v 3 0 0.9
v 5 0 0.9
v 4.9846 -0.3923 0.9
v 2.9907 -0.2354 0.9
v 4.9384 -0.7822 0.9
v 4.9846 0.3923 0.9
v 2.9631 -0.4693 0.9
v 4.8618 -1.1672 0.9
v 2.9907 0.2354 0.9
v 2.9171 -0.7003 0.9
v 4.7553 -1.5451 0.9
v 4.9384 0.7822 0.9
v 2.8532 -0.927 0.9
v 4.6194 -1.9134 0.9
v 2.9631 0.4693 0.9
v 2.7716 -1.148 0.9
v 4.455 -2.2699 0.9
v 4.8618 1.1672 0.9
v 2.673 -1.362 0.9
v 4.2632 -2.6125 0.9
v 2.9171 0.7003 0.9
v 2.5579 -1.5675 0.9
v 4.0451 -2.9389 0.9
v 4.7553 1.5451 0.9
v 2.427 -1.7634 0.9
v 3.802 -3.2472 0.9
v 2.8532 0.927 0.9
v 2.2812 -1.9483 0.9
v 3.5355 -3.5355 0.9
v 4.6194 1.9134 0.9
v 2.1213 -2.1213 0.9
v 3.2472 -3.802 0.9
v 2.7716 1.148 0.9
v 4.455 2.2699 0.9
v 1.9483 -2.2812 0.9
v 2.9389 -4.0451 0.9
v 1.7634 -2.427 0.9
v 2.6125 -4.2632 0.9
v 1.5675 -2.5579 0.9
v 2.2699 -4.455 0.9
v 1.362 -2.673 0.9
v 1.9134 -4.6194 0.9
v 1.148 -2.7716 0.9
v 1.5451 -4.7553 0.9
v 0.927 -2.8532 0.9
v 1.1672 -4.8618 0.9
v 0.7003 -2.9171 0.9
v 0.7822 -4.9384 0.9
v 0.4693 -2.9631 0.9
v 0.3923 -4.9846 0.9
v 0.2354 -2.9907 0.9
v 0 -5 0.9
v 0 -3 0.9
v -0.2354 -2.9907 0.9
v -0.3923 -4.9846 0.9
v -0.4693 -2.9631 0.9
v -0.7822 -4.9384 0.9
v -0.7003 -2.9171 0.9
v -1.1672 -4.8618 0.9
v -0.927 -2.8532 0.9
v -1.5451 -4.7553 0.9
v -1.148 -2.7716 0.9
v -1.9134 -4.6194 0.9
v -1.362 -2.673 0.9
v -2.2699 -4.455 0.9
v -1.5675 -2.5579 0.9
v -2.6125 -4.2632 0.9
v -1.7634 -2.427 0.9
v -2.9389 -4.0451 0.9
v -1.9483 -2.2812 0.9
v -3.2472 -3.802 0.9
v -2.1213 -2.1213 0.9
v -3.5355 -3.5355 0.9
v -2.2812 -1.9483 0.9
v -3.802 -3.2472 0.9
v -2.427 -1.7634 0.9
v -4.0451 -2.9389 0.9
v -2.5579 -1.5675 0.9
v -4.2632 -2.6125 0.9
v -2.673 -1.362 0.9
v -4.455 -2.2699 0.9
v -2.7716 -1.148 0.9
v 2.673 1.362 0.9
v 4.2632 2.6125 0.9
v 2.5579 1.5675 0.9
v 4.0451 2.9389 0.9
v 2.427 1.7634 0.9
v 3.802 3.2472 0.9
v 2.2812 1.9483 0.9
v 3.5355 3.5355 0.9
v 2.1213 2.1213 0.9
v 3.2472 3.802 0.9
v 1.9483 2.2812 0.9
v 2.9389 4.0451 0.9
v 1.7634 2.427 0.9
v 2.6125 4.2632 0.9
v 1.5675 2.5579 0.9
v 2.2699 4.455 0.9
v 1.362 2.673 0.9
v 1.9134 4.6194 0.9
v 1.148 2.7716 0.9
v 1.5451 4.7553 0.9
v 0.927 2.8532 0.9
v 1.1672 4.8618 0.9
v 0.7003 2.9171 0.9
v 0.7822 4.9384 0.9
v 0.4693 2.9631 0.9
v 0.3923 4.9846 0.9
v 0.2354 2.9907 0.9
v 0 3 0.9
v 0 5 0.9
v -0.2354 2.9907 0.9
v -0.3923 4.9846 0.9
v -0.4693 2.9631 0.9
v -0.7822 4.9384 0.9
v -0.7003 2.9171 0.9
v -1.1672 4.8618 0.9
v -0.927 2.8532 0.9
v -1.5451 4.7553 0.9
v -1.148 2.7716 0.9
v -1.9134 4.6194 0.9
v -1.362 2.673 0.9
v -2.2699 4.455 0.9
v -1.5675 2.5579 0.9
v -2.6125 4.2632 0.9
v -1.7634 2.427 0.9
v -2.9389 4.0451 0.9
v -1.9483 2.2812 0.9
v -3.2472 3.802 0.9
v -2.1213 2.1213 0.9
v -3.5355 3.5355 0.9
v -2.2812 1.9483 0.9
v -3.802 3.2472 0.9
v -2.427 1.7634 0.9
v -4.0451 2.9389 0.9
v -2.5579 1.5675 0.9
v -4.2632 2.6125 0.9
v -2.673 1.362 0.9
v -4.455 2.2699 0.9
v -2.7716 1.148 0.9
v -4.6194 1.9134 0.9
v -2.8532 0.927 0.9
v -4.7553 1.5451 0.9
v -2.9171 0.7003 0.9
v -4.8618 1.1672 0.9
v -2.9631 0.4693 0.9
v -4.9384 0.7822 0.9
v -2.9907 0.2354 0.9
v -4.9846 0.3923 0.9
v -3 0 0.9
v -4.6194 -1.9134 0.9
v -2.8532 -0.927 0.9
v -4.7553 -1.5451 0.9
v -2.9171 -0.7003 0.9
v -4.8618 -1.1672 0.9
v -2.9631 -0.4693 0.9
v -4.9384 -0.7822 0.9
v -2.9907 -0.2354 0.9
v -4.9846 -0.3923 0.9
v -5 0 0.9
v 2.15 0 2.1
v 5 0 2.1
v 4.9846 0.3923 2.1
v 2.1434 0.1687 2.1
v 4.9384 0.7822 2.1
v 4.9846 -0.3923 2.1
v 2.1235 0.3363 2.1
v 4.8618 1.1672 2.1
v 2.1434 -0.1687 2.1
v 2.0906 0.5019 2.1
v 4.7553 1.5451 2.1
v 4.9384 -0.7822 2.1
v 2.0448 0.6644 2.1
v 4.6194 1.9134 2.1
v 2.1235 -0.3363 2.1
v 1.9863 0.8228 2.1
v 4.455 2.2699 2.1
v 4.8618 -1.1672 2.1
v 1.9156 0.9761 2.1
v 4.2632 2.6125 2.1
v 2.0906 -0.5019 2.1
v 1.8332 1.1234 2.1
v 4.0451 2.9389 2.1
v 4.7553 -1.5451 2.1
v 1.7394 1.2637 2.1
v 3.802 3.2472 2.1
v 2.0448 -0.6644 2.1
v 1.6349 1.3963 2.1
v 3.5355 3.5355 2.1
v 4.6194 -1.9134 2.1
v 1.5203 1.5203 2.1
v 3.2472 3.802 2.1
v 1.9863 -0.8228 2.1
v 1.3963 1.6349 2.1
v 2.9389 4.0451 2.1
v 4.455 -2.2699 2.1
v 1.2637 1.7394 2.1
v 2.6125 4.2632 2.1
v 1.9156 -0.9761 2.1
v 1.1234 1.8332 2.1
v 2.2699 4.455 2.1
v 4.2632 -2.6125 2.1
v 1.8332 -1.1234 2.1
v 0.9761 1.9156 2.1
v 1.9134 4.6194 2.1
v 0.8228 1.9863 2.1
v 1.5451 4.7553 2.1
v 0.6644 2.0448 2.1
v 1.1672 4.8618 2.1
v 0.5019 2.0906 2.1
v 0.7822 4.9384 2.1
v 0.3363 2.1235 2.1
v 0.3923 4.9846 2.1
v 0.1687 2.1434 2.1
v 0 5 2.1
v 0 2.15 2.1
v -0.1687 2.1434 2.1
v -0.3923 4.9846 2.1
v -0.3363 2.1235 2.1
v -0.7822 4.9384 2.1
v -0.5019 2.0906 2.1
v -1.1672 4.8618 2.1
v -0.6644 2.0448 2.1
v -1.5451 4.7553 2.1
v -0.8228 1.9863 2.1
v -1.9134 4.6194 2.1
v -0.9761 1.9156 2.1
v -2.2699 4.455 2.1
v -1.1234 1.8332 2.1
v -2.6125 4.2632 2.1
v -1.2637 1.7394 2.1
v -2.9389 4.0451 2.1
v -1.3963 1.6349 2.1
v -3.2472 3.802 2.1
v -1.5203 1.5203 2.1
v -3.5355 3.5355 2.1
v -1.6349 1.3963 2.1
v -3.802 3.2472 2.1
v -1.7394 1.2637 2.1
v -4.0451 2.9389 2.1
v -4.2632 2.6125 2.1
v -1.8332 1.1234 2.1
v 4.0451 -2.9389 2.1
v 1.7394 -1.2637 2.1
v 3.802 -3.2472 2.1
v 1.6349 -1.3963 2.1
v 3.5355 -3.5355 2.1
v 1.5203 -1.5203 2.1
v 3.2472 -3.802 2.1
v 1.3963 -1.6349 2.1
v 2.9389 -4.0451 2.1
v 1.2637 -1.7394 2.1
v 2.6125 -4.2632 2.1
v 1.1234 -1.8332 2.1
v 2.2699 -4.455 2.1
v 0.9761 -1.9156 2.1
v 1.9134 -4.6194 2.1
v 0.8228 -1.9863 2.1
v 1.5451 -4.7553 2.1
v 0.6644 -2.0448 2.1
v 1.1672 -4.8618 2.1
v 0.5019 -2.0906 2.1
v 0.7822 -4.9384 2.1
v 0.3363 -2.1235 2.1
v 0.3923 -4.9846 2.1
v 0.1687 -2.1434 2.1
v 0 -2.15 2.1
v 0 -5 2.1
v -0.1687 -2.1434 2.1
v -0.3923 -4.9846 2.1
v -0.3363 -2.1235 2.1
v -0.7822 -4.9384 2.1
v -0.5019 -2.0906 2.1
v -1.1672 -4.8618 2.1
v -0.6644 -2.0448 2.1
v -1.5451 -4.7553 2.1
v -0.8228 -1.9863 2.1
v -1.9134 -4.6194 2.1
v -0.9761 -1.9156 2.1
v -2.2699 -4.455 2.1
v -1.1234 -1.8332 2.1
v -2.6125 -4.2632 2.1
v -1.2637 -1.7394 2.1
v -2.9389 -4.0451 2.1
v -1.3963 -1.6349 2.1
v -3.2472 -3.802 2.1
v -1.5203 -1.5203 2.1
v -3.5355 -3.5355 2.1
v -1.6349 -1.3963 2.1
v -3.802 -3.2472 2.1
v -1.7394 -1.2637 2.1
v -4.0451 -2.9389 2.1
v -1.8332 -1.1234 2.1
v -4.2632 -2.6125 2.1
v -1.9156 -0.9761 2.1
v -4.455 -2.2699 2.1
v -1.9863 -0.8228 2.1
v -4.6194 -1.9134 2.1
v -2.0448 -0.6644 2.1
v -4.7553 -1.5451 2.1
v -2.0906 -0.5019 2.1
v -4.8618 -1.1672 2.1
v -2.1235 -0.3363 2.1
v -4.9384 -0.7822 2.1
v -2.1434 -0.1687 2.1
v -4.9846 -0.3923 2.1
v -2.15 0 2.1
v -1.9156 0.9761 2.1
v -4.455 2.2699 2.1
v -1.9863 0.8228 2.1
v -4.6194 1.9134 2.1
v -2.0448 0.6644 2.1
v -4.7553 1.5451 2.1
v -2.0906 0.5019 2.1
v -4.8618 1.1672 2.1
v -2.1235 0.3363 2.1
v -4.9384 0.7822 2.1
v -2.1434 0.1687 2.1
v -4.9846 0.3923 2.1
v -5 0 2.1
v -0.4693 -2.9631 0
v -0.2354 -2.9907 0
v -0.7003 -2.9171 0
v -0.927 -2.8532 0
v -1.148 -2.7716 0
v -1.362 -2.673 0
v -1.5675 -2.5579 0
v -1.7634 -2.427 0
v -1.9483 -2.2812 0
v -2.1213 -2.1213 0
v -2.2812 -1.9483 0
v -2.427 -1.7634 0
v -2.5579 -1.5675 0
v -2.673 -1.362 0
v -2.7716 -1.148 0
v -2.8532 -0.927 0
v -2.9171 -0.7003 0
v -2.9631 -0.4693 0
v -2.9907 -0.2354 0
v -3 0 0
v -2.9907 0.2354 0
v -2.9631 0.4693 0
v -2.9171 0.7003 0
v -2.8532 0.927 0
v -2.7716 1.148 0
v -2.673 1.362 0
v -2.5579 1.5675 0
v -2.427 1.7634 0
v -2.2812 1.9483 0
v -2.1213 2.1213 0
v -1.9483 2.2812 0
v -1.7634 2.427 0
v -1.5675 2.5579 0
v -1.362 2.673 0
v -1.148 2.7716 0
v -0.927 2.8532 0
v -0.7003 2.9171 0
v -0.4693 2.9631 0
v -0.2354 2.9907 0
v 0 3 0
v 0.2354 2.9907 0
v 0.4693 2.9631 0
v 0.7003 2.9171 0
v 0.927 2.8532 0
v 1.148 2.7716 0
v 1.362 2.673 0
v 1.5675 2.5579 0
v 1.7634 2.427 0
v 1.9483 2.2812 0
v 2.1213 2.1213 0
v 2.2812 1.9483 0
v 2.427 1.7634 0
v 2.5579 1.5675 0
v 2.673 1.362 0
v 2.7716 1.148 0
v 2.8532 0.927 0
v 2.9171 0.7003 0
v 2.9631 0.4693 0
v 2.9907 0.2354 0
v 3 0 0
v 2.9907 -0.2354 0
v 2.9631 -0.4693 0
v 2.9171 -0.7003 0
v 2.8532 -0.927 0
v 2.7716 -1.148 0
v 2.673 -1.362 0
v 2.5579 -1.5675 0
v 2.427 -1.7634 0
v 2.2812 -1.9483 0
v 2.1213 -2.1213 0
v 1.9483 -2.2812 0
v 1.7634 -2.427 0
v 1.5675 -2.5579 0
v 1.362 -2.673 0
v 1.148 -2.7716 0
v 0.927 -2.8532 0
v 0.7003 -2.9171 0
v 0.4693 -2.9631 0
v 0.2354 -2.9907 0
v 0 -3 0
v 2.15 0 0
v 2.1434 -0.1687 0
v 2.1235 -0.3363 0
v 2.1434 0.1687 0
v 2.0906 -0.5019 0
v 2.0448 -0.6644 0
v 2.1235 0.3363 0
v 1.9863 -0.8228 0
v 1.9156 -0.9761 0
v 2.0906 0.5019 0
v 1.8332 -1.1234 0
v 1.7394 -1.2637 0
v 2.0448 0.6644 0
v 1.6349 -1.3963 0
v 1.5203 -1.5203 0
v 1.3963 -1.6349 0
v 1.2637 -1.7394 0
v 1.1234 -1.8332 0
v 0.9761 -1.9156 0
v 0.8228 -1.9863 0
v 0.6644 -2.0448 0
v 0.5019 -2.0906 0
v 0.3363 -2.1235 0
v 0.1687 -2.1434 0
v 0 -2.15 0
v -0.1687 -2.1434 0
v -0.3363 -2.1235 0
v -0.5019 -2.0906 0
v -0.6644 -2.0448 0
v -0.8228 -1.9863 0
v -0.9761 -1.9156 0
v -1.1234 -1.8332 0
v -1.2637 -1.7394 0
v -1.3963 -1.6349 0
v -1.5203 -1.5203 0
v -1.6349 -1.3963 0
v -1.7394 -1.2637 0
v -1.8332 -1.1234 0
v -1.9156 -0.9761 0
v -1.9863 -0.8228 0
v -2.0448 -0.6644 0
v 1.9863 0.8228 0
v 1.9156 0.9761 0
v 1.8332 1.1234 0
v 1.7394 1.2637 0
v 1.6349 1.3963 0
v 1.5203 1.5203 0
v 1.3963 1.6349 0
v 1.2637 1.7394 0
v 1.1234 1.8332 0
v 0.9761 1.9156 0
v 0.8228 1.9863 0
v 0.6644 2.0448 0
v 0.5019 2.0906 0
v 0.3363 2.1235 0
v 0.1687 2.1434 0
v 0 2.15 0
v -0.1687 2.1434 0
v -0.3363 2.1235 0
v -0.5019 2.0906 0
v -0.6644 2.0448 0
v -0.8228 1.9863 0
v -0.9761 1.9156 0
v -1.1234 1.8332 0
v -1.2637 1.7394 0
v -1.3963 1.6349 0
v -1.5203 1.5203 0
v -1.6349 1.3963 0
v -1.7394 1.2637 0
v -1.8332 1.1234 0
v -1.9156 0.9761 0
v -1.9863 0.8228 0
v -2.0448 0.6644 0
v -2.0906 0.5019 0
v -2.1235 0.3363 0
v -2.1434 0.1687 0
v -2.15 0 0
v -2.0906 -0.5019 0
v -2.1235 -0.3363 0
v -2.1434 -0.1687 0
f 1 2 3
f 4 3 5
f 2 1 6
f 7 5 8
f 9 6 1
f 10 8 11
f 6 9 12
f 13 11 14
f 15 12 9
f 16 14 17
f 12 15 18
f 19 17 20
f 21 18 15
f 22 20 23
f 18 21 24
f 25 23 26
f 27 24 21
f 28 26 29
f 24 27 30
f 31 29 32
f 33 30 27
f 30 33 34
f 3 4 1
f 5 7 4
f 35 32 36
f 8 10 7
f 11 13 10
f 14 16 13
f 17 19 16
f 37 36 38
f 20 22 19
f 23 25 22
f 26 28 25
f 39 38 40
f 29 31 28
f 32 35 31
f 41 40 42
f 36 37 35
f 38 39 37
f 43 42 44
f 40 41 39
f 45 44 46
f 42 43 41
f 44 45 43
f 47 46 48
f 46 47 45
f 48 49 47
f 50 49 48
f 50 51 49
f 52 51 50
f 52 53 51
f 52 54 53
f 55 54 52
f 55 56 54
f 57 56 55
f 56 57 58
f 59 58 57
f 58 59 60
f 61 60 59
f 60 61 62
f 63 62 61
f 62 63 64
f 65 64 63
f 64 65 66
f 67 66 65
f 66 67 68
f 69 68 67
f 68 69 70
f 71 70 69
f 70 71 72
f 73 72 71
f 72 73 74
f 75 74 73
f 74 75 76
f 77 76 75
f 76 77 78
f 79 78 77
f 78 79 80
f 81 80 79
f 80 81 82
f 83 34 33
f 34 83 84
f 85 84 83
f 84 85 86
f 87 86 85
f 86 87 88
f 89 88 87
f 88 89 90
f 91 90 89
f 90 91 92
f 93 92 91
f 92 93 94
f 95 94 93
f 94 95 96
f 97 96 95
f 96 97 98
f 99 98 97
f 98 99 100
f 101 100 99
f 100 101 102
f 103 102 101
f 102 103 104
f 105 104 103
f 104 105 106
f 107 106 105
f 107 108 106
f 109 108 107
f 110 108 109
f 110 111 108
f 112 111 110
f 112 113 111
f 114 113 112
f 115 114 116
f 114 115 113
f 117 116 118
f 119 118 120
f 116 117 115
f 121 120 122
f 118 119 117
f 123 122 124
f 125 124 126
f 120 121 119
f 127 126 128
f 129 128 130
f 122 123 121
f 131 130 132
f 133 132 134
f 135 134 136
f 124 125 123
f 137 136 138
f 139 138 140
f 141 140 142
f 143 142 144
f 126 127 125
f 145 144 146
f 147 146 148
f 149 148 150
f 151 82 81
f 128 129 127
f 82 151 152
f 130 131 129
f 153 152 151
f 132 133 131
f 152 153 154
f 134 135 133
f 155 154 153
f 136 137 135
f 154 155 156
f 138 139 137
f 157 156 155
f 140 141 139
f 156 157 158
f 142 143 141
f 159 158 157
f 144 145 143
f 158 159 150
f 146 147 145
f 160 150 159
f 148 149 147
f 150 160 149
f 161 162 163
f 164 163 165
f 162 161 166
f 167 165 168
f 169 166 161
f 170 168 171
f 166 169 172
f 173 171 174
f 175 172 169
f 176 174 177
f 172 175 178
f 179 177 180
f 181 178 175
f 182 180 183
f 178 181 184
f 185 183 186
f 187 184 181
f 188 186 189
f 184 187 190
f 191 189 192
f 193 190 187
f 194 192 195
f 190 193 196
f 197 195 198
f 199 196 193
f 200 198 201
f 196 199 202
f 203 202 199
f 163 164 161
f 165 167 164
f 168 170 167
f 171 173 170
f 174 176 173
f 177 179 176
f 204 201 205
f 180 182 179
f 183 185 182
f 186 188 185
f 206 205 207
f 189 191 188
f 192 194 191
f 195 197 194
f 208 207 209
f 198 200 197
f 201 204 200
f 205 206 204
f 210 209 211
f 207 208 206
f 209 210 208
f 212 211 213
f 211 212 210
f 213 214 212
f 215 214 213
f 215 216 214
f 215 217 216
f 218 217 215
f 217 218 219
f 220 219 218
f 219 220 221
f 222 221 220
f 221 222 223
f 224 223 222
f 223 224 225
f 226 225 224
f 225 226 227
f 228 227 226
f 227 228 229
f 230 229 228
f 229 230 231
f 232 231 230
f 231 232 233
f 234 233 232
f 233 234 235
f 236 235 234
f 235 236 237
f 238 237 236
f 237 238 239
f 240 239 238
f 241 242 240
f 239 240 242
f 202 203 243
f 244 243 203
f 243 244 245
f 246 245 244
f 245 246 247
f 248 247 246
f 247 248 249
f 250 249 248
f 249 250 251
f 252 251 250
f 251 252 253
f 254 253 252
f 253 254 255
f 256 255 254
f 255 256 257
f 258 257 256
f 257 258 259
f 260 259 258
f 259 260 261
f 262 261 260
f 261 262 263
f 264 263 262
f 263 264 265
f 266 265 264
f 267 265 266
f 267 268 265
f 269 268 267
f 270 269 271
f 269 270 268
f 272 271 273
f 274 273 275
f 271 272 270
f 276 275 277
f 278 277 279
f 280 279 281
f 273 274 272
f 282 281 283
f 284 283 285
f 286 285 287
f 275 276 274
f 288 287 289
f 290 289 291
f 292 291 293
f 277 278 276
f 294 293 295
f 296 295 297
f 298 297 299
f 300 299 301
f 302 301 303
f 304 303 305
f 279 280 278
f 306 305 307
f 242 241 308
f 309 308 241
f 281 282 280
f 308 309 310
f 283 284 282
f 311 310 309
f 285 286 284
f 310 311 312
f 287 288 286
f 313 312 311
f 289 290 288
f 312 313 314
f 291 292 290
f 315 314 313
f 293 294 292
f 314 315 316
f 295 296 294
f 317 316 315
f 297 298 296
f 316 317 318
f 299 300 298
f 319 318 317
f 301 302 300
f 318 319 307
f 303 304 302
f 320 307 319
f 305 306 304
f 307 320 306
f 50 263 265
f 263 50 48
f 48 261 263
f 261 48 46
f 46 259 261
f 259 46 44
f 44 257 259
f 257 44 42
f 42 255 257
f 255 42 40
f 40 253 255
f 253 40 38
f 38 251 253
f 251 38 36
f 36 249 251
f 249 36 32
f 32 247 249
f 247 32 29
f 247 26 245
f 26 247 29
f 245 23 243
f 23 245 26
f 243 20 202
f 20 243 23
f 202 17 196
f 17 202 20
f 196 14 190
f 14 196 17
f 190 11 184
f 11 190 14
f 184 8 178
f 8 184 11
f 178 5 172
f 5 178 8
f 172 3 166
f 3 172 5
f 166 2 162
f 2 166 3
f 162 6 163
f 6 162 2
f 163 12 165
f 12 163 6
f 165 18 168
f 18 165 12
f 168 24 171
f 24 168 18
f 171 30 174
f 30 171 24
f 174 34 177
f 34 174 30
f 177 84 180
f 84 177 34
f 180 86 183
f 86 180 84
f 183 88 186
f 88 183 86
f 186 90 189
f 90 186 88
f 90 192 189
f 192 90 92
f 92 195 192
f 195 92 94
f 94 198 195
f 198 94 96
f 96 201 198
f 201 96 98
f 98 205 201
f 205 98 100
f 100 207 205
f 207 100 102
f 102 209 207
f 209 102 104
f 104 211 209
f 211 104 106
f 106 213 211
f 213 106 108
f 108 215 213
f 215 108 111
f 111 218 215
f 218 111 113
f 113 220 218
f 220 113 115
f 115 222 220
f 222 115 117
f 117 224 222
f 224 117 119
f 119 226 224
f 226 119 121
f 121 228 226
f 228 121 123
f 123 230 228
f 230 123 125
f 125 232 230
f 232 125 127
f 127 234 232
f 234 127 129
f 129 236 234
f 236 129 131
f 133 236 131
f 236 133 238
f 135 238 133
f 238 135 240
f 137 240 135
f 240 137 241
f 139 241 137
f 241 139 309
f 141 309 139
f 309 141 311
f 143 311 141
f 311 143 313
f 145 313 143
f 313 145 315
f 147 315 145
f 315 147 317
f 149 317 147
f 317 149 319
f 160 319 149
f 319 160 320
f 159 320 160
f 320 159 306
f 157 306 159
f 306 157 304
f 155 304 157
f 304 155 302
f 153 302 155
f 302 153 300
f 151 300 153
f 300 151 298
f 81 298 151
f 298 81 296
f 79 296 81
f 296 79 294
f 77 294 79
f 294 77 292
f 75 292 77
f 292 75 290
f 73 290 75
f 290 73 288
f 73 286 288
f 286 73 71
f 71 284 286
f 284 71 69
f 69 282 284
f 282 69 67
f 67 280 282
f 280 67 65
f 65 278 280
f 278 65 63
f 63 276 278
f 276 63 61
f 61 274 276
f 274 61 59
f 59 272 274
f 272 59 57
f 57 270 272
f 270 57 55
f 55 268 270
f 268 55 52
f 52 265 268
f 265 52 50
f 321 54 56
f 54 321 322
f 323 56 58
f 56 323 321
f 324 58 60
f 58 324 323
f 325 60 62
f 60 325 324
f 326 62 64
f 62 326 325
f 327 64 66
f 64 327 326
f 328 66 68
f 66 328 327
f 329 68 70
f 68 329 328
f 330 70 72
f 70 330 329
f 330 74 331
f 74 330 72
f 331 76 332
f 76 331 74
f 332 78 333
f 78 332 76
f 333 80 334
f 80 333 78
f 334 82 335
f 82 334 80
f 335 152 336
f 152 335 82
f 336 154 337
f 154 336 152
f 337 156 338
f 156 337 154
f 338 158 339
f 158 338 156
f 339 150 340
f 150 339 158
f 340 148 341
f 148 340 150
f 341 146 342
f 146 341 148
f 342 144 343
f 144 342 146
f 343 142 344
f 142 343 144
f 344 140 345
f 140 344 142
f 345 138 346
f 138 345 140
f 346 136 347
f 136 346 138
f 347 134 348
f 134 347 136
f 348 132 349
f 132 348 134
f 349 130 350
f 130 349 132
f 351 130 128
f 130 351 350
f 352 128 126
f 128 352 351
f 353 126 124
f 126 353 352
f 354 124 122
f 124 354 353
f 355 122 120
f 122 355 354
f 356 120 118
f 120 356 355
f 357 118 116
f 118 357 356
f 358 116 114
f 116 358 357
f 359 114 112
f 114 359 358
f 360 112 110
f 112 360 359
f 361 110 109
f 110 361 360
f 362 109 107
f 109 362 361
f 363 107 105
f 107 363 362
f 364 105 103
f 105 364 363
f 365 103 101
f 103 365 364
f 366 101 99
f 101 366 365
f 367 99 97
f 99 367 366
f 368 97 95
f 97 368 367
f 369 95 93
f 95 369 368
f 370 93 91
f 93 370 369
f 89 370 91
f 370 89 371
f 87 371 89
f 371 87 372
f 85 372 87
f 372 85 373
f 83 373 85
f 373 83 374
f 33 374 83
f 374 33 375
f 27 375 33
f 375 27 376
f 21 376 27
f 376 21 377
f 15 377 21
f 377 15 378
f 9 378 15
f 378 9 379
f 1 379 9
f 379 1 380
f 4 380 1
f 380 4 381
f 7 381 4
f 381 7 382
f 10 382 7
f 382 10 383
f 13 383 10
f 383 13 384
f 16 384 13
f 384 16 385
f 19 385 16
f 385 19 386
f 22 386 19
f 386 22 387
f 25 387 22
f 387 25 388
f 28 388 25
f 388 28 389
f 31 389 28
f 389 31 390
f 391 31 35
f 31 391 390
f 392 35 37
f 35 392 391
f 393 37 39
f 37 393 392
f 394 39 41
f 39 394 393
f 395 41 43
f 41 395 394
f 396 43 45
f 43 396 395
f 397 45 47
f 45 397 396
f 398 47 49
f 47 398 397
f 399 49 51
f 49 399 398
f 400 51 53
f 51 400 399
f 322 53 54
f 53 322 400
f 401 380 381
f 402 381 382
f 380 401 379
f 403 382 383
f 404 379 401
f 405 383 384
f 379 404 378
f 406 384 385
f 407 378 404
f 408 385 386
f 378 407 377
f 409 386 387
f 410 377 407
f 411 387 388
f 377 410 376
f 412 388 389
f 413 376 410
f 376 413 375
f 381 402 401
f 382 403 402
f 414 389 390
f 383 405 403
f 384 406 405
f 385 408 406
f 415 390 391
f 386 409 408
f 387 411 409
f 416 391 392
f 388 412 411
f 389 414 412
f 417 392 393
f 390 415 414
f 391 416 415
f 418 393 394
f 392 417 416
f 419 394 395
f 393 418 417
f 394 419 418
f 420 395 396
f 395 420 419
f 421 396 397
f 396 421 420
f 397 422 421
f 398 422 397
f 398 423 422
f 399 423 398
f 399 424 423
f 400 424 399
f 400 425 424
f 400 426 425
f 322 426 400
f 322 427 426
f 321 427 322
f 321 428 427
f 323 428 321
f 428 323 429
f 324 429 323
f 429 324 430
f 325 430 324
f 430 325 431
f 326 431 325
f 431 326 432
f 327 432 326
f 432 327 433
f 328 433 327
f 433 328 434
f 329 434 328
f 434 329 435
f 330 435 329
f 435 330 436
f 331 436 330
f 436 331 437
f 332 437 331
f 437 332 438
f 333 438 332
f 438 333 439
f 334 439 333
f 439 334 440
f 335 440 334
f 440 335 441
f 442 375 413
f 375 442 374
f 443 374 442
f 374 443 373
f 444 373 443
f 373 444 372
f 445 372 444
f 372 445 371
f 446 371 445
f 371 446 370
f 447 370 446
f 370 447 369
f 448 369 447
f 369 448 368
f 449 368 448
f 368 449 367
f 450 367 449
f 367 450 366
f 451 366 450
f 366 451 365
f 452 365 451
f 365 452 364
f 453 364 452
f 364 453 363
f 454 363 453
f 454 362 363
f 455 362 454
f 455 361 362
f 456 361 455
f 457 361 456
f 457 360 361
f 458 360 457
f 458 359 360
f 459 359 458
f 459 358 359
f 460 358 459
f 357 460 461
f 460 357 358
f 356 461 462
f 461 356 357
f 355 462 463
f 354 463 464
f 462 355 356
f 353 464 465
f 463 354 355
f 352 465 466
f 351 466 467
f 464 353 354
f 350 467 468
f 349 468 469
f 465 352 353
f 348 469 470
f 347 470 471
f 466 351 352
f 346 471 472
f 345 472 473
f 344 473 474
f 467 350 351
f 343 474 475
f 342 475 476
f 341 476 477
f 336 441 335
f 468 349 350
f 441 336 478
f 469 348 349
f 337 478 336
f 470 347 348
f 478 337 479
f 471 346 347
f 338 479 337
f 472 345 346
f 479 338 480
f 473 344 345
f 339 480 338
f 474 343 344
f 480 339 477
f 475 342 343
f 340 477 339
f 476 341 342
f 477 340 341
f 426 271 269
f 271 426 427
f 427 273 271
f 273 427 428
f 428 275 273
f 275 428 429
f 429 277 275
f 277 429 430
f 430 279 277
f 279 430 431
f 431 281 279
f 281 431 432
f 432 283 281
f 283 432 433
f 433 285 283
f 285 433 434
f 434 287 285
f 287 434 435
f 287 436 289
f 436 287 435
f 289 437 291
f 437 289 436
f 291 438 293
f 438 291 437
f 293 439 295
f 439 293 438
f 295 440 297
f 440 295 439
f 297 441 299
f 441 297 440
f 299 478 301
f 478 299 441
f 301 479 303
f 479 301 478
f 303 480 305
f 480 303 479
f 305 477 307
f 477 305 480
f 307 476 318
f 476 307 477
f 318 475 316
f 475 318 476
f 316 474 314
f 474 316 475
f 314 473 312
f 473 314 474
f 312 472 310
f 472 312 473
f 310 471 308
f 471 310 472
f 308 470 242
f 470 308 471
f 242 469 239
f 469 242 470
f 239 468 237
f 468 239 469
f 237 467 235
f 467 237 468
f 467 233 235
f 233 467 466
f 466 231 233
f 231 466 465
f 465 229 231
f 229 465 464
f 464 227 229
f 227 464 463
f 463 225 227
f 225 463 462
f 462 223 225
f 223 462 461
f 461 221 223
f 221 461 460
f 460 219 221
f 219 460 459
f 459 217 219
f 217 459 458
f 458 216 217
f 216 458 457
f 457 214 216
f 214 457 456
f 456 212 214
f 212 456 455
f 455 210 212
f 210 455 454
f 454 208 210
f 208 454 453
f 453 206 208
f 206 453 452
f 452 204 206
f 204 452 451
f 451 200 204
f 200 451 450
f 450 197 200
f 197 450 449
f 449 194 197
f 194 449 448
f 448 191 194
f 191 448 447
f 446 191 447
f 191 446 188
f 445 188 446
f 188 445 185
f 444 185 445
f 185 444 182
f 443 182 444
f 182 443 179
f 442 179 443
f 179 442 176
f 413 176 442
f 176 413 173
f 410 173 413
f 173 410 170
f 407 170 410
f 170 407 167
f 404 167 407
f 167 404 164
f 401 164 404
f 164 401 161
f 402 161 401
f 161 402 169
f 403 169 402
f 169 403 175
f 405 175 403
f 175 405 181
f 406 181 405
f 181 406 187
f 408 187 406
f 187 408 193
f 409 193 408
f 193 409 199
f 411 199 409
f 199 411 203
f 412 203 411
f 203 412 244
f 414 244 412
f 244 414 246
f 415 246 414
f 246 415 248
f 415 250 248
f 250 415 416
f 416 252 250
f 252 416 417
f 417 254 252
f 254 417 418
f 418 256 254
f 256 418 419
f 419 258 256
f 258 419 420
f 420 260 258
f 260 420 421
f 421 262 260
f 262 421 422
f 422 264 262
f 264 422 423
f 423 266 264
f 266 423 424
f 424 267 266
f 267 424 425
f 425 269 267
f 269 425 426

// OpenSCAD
// Top hat spacers

ID = 4.3;
OD = 6;
T = 0.9;
TD = OD + 4;
TT = 1.2;

$fn = 80;

translate([0,0,T])
    linear_extrude(TT)
        difference() {
            circle(d=TD);
            circle(d=OD);
        }

linear_extrude(T + TT)
    difference() {
        circle(d=OD);
        circle(d=ID);
    }
